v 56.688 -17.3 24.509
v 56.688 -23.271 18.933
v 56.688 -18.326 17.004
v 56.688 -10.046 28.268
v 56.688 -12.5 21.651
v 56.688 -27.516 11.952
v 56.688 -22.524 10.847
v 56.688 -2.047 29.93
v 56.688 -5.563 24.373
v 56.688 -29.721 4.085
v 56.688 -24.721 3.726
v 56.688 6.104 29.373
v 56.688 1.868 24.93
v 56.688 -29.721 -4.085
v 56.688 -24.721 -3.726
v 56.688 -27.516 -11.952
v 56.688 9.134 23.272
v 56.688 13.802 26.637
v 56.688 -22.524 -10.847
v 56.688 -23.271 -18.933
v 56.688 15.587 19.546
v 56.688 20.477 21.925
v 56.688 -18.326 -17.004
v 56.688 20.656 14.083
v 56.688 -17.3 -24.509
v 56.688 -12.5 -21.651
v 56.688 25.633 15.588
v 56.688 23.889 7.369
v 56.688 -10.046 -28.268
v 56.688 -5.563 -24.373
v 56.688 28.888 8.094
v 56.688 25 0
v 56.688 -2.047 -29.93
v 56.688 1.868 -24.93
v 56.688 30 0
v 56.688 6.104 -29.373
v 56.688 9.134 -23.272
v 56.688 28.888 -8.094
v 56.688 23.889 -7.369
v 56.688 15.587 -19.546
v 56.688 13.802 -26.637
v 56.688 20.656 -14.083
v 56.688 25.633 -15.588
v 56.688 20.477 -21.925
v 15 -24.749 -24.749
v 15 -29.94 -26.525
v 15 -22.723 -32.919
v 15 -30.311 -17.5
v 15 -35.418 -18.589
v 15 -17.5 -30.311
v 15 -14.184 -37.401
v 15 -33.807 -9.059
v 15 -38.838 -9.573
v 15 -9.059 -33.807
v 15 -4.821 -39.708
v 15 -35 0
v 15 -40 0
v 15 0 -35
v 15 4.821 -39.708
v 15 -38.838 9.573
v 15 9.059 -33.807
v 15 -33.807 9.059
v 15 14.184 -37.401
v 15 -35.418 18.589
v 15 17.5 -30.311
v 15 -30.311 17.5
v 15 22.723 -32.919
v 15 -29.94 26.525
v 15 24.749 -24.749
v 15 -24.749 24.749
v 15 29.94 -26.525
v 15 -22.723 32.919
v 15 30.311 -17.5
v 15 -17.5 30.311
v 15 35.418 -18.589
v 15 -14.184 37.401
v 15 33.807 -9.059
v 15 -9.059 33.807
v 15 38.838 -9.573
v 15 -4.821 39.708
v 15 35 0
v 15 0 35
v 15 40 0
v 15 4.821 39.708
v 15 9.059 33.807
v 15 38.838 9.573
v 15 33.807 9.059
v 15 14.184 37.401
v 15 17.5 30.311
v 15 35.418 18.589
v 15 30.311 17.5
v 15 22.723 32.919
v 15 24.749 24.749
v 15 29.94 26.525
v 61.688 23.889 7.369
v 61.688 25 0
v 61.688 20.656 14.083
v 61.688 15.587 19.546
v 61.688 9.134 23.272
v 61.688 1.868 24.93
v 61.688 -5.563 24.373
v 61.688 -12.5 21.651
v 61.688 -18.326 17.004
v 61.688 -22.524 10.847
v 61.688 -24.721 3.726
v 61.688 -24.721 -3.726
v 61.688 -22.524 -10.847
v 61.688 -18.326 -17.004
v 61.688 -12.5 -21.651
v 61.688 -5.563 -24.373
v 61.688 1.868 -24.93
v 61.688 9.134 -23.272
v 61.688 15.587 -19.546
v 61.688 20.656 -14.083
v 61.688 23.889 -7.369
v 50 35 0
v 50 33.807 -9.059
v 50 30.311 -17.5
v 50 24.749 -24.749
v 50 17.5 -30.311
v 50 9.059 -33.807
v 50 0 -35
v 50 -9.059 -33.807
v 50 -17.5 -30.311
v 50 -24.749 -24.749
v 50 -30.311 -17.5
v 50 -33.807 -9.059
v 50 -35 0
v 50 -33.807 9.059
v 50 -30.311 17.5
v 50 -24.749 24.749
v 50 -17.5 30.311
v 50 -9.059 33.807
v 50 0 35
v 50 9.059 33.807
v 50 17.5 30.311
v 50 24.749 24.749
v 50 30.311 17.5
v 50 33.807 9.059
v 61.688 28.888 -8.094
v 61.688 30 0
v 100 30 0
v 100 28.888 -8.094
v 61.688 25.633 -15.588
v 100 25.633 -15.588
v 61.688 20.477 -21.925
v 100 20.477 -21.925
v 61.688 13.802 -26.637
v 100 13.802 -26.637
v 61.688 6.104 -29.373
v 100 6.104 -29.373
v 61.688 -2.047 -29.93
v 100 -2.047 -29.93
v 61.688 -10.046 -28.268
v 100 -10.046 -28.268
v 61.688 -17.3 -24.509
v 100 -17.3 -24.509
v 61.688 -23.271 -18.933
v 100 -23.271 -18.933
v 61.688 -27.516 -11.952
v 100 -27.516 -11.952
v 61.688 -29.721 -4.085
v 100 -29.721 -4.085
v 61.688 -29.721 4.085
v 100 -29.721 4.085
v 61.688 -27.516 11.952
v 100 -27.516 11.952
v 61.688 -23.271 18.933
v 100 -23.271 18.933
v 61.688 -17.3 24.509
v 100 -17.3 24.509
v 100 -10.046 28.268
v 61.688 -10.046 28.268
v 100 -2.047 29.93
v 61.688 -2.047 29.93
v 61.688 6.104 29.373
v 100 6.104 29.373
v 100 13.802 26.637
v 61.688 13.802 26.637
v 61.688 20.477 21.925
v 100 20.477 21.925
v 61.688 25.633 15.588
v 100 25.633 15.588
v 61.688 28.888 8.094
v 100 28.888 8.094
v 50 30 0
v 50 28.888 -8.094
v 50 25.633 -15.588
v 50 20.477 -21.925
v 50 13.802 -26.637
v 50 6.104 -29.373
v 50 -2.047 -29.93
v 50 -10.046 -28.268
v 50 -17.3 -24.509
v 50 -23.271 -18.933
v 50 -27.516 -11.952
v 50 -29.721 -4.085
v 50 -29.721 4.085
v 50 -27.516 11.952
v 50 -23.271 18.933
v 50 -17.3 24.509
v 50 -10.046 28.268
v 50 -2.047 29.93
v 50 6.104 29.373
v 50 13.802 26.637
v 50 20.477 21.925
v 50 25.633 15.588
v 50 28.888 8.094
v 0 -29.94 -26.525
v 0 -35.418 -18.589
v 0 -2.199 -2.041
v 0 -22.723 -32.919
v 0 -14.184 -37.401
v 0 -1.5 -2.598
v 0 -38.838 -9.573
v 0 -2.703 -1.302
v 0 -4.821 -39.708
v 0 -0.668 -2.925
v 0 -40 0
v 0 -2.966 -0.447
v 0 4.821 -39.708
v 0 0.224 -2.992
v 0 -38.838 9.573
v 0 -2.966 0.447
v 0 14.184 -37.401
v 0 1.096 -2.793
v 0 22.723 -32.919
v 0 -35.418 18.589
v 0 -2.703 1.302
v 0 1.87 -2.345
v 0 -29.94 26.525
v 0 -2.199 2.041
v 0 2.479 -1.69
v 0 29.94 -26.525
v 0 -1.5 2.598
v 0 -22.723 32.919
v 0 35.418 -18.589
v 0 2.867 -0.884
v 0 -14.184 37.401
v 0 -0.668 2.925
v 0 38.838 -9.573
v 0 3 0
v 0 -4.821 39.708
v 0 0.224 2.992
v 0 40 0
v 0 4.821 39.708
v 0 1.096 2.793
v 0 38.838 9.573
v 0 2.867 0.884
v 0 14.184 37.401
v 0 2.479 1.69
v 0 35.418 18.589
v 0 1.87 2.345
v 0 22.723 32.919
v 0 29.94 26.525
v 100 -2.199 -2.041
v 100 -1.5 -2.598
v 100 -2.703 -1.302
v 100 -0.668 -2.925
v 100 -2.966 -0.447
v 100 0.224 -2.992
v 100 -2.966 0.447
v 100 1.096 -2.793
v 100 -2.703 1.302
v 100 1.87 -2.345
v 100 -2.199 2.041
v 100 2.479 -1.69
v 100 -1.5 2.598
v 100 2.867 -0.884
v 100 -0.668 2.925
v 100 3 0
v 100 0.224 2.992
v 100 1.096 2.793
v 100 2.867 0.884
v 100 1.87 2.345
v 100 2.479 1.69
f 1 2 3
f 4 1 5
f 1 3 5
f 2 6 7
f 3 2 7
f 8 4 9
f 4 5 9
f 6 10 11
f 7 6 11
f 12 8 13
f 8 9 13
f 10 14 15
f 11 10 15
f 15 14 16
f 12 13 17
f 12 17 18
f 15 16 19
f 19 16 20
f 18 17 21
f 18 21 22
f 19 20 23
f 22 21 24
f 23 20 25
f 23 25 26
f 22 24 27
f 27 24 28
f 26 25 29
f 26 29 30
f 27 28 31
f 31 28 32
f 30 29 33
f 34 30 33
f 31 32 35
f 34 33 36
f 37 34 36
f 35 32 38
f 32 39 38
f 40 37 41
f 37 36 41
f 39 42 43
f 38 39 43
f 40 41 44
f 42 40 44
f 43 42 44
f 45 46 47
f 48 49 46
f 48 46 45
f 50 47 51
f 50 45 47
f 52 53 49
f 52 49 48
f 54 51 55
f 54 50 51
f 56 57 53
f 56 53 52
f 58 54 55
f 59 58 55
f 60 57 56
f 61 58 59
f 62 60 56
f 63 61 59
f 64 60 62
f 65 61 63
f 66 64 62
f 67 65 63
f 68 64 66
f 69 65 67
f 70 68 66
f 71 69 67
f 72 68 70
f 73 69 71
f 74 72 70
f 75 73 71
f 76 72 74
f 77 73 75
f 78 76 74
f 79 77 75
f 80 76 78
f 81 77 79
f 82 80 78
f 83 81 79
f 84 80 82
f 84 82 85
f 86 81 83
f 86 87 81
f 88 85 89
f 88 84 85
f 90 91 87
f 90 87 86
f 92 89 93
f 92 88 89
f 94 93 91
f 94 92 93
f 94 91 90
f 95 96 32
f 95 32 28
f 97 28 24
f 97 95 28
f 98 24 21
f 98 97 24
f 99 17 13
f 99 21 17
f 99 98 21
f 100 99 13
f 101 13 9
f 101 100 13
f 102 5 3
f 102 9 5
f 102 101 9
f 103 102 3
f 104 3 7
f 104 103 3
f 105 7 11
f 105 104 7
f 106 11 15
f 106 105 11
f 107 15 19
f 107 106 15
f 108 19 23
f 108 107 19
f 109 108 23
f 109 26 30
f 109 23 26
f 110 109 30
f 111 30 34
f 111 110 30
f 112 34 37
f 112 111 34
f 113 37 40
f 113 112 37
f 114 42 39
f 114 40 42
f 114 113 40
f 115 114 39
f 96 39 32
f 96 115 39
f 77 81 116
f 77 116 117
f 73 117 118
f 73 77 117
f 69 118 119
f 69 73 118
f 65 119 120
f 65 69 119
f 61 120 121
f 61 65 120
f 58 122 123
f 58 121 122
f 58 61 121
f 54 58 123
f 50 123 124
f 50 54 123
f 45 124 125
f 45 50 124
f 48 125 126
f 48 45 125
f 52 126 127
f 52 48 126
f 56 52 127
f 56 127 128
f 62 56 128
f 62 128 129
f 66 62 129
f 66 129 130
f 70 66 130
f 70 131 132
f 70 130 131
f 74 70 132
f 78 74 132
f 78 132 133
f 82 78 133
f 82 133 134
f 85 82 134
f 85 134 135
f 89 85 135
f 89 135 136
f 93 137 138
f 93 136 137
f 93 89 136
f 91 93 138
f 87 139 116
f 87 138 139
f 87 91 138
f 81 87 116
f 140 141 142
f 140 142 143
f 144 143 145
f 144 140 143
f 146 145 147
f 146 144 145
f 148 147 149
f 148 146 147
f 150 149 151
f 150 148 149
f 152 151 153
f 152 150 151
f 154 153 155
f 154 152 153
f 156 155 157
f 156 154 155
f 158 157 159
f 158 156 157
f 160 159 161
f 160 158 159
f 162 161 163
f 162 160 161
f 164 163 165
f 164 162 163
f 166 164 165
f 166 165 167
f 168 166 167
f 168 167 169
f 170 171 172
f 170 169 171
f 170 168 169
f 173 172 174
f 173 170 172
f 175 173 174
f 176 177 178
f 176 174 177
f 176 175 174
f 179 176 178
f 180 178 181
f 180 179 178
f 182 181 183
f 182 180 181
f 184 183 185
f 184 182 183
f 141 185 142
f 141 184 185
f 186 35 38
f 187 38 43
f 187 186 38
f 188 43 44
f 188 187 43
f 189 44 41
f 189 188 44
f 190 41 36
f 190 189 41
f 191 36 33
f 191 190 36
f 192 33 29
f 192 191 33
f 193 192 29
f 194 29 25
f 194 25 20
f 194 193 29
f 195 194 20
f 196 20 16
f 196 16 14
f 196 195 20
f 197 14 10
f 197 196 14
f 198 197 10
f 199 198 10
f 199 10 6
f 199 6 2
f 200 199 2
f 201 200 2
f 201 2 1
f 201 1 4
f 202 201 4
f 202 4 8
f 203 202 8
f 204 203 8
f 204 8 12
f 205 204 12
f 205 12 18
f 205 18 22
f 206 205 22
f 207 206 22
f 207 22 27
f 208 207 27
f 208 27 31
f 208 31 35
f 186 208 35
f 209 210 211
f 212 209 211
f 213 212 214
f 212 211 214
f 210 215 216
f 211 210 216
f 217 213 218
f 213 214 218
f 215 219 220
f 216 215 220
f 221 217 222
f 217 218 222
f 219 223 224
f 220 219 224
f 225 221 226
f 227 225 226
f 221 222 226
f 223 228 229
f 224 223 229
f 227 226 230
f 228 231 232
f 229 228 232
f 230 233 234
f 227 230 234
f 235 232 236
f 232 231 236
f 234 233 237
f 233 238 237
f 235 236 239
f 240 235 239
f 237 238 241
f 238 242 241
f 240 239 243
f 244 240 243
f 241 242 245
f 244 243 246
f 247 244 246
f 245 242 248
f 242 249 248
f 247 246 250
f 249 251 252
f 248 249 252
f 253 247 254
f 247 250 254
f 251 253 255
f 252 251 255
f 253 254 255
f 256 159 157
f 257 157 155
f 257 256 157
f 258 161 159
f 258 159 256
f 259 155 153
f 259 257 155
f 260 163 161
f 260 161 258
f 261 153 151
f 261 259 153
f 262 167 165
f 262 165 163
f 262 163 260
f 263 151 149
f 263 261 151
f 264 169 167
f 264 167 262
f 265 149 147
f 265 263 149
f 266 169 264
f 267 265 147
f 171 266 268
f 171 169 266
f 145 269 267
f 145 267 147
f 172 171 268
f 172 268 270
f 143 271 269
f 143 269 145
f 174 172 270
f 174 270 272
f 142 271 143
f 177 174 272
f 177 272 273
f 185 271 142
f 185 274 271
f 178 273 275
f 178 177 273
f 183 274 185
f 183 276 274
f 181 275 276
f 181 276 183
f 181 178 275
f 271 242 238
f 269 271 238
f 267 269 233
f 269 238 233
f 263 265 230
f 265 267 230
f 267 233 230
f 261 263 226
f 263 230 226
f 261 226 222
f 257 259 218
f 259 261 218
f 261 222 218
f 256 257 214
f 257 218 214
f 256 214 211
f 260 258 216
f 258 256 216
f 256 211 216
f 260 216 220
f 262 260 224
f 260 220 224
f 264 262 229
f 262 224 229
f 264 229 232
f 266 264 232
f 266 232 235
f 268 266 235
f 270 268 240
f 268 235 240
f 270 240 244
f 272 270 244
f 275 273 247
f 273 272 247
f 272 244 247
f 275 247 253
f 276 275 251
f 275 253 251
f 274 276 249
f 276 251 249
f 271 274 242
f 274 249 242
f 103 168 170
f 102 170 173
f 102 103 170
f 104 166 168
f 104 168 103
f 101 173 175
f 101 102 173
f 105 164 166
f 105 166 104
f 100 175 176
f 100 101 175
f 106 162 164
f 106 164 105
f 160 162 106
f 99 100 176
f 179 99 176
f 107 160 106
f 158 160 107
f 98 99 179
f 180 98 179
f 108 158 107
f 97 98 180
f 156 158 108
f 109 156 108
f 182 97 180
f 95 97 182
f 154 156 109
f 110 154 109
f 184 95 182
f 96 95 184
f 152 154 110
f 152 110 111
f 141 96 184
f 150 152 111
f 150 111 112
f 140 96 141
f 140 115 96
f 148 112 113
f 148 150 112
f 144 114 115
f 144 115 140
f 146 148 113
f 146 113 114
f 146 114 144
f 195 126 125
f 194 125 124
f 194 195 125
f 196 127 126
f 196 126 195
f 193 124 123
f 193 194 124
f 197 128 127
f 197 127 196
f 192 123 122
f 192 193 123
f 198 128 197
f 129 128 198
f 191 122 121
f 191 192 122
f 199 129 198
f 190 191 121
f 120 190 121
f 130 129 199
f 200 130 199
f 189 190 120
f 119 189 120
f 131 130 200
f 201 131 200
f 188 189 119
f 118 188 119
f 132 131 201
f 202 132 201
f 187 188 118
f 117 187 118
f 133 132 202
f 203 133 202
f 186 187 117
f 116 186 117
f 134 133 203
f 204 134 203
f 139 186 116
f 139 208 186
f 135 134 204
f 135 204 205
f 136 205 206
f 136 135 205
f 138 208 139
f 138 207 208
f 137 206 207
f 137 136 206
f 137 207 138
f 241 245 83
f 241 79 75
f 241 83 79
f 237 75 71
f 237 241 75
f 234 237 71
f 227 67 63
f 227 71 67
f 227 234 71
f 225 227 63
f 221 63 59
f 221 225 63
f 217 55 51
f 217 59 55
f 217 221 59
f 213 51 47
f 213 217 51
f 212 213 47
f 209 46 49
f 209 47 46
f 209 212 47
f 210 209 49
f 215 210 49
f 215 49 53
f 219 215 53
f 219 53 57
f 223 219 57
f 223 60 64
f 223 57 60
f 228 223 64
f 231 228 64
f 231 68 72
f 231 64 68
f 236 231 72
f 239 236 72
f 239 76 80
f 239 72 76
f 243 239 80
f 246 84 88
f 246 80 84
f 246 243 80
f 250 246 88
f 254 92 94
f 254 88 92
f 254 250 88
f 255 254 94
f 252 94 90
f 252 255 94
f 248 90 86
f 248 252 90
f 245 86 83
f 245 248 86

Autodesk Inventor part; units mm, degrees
ref_plane "YZ Plane" through (0, 0, 0) normal (1, 0, 0) x (0, 1, 0)
ref_plane "XZ Plane" through (0, 0, 0) normal (0, 1, 0) x (-1, 0, 0)
ref_plane "XY Plane" through (0, 0, 0) normal (0, 0, 1) x (1, 0, 0)
sketch "Эскиз1" plane through (0, 0, 0) normal (0, 0, 1) x (1, 0, 0)
  line L0 (0, 0) -> (100, 0)
  line L1 (100, 0) -> (100, 30)
  line L2 (100, 30) -> (50, 30)
  line L3 (50, 30) -> (50, 35)
  line L4 (50, 35) -> (15, 35)
  line L5 (15, 35) -> (15, 40)
  line L6 (15, 40) -> (0, 40)
  line L7 (0, 40) -> (0, 0)
  line L8 (56.6884, 30) -> (56.6884, 25)
  line L9 (56.6884, 25) -> (61.6884, 25)
  line L10 (61.6884, 25) -> (61.6884, 30)
  dimension "d0" = 100
  dimension "d1" = 30
  dimension "d2" = 50
  dimension "d3" = 5
  dimension "d4" = 35
  dimension "d5" = 5
  dimension "d7" = 5
  dimension "d8" = 5
  dimension "d9" = 11.6884
revolve "Вращение1" add sketch "Эскиз1" angle 360 about axis through (0, 0, 0) along (1, 0, 0)
revolve "Вращение2" cut sketch "Эскиз1" angle 360 about axis through (0, 0, 0) along (-1, 0, 0) contours L10 L9 L8 L2
sketch "Эскиз2" plane through (0, 0, 0) normal (1, 0, 0) x (0, 1, 0)
  circle A0 centre (0, 0) radius 3
  dimension "d11" = 6
extrude "Выдавливание1" cut sketch "Эскиз2" along normal up to surface (100 mm away)
properties part number "1"
